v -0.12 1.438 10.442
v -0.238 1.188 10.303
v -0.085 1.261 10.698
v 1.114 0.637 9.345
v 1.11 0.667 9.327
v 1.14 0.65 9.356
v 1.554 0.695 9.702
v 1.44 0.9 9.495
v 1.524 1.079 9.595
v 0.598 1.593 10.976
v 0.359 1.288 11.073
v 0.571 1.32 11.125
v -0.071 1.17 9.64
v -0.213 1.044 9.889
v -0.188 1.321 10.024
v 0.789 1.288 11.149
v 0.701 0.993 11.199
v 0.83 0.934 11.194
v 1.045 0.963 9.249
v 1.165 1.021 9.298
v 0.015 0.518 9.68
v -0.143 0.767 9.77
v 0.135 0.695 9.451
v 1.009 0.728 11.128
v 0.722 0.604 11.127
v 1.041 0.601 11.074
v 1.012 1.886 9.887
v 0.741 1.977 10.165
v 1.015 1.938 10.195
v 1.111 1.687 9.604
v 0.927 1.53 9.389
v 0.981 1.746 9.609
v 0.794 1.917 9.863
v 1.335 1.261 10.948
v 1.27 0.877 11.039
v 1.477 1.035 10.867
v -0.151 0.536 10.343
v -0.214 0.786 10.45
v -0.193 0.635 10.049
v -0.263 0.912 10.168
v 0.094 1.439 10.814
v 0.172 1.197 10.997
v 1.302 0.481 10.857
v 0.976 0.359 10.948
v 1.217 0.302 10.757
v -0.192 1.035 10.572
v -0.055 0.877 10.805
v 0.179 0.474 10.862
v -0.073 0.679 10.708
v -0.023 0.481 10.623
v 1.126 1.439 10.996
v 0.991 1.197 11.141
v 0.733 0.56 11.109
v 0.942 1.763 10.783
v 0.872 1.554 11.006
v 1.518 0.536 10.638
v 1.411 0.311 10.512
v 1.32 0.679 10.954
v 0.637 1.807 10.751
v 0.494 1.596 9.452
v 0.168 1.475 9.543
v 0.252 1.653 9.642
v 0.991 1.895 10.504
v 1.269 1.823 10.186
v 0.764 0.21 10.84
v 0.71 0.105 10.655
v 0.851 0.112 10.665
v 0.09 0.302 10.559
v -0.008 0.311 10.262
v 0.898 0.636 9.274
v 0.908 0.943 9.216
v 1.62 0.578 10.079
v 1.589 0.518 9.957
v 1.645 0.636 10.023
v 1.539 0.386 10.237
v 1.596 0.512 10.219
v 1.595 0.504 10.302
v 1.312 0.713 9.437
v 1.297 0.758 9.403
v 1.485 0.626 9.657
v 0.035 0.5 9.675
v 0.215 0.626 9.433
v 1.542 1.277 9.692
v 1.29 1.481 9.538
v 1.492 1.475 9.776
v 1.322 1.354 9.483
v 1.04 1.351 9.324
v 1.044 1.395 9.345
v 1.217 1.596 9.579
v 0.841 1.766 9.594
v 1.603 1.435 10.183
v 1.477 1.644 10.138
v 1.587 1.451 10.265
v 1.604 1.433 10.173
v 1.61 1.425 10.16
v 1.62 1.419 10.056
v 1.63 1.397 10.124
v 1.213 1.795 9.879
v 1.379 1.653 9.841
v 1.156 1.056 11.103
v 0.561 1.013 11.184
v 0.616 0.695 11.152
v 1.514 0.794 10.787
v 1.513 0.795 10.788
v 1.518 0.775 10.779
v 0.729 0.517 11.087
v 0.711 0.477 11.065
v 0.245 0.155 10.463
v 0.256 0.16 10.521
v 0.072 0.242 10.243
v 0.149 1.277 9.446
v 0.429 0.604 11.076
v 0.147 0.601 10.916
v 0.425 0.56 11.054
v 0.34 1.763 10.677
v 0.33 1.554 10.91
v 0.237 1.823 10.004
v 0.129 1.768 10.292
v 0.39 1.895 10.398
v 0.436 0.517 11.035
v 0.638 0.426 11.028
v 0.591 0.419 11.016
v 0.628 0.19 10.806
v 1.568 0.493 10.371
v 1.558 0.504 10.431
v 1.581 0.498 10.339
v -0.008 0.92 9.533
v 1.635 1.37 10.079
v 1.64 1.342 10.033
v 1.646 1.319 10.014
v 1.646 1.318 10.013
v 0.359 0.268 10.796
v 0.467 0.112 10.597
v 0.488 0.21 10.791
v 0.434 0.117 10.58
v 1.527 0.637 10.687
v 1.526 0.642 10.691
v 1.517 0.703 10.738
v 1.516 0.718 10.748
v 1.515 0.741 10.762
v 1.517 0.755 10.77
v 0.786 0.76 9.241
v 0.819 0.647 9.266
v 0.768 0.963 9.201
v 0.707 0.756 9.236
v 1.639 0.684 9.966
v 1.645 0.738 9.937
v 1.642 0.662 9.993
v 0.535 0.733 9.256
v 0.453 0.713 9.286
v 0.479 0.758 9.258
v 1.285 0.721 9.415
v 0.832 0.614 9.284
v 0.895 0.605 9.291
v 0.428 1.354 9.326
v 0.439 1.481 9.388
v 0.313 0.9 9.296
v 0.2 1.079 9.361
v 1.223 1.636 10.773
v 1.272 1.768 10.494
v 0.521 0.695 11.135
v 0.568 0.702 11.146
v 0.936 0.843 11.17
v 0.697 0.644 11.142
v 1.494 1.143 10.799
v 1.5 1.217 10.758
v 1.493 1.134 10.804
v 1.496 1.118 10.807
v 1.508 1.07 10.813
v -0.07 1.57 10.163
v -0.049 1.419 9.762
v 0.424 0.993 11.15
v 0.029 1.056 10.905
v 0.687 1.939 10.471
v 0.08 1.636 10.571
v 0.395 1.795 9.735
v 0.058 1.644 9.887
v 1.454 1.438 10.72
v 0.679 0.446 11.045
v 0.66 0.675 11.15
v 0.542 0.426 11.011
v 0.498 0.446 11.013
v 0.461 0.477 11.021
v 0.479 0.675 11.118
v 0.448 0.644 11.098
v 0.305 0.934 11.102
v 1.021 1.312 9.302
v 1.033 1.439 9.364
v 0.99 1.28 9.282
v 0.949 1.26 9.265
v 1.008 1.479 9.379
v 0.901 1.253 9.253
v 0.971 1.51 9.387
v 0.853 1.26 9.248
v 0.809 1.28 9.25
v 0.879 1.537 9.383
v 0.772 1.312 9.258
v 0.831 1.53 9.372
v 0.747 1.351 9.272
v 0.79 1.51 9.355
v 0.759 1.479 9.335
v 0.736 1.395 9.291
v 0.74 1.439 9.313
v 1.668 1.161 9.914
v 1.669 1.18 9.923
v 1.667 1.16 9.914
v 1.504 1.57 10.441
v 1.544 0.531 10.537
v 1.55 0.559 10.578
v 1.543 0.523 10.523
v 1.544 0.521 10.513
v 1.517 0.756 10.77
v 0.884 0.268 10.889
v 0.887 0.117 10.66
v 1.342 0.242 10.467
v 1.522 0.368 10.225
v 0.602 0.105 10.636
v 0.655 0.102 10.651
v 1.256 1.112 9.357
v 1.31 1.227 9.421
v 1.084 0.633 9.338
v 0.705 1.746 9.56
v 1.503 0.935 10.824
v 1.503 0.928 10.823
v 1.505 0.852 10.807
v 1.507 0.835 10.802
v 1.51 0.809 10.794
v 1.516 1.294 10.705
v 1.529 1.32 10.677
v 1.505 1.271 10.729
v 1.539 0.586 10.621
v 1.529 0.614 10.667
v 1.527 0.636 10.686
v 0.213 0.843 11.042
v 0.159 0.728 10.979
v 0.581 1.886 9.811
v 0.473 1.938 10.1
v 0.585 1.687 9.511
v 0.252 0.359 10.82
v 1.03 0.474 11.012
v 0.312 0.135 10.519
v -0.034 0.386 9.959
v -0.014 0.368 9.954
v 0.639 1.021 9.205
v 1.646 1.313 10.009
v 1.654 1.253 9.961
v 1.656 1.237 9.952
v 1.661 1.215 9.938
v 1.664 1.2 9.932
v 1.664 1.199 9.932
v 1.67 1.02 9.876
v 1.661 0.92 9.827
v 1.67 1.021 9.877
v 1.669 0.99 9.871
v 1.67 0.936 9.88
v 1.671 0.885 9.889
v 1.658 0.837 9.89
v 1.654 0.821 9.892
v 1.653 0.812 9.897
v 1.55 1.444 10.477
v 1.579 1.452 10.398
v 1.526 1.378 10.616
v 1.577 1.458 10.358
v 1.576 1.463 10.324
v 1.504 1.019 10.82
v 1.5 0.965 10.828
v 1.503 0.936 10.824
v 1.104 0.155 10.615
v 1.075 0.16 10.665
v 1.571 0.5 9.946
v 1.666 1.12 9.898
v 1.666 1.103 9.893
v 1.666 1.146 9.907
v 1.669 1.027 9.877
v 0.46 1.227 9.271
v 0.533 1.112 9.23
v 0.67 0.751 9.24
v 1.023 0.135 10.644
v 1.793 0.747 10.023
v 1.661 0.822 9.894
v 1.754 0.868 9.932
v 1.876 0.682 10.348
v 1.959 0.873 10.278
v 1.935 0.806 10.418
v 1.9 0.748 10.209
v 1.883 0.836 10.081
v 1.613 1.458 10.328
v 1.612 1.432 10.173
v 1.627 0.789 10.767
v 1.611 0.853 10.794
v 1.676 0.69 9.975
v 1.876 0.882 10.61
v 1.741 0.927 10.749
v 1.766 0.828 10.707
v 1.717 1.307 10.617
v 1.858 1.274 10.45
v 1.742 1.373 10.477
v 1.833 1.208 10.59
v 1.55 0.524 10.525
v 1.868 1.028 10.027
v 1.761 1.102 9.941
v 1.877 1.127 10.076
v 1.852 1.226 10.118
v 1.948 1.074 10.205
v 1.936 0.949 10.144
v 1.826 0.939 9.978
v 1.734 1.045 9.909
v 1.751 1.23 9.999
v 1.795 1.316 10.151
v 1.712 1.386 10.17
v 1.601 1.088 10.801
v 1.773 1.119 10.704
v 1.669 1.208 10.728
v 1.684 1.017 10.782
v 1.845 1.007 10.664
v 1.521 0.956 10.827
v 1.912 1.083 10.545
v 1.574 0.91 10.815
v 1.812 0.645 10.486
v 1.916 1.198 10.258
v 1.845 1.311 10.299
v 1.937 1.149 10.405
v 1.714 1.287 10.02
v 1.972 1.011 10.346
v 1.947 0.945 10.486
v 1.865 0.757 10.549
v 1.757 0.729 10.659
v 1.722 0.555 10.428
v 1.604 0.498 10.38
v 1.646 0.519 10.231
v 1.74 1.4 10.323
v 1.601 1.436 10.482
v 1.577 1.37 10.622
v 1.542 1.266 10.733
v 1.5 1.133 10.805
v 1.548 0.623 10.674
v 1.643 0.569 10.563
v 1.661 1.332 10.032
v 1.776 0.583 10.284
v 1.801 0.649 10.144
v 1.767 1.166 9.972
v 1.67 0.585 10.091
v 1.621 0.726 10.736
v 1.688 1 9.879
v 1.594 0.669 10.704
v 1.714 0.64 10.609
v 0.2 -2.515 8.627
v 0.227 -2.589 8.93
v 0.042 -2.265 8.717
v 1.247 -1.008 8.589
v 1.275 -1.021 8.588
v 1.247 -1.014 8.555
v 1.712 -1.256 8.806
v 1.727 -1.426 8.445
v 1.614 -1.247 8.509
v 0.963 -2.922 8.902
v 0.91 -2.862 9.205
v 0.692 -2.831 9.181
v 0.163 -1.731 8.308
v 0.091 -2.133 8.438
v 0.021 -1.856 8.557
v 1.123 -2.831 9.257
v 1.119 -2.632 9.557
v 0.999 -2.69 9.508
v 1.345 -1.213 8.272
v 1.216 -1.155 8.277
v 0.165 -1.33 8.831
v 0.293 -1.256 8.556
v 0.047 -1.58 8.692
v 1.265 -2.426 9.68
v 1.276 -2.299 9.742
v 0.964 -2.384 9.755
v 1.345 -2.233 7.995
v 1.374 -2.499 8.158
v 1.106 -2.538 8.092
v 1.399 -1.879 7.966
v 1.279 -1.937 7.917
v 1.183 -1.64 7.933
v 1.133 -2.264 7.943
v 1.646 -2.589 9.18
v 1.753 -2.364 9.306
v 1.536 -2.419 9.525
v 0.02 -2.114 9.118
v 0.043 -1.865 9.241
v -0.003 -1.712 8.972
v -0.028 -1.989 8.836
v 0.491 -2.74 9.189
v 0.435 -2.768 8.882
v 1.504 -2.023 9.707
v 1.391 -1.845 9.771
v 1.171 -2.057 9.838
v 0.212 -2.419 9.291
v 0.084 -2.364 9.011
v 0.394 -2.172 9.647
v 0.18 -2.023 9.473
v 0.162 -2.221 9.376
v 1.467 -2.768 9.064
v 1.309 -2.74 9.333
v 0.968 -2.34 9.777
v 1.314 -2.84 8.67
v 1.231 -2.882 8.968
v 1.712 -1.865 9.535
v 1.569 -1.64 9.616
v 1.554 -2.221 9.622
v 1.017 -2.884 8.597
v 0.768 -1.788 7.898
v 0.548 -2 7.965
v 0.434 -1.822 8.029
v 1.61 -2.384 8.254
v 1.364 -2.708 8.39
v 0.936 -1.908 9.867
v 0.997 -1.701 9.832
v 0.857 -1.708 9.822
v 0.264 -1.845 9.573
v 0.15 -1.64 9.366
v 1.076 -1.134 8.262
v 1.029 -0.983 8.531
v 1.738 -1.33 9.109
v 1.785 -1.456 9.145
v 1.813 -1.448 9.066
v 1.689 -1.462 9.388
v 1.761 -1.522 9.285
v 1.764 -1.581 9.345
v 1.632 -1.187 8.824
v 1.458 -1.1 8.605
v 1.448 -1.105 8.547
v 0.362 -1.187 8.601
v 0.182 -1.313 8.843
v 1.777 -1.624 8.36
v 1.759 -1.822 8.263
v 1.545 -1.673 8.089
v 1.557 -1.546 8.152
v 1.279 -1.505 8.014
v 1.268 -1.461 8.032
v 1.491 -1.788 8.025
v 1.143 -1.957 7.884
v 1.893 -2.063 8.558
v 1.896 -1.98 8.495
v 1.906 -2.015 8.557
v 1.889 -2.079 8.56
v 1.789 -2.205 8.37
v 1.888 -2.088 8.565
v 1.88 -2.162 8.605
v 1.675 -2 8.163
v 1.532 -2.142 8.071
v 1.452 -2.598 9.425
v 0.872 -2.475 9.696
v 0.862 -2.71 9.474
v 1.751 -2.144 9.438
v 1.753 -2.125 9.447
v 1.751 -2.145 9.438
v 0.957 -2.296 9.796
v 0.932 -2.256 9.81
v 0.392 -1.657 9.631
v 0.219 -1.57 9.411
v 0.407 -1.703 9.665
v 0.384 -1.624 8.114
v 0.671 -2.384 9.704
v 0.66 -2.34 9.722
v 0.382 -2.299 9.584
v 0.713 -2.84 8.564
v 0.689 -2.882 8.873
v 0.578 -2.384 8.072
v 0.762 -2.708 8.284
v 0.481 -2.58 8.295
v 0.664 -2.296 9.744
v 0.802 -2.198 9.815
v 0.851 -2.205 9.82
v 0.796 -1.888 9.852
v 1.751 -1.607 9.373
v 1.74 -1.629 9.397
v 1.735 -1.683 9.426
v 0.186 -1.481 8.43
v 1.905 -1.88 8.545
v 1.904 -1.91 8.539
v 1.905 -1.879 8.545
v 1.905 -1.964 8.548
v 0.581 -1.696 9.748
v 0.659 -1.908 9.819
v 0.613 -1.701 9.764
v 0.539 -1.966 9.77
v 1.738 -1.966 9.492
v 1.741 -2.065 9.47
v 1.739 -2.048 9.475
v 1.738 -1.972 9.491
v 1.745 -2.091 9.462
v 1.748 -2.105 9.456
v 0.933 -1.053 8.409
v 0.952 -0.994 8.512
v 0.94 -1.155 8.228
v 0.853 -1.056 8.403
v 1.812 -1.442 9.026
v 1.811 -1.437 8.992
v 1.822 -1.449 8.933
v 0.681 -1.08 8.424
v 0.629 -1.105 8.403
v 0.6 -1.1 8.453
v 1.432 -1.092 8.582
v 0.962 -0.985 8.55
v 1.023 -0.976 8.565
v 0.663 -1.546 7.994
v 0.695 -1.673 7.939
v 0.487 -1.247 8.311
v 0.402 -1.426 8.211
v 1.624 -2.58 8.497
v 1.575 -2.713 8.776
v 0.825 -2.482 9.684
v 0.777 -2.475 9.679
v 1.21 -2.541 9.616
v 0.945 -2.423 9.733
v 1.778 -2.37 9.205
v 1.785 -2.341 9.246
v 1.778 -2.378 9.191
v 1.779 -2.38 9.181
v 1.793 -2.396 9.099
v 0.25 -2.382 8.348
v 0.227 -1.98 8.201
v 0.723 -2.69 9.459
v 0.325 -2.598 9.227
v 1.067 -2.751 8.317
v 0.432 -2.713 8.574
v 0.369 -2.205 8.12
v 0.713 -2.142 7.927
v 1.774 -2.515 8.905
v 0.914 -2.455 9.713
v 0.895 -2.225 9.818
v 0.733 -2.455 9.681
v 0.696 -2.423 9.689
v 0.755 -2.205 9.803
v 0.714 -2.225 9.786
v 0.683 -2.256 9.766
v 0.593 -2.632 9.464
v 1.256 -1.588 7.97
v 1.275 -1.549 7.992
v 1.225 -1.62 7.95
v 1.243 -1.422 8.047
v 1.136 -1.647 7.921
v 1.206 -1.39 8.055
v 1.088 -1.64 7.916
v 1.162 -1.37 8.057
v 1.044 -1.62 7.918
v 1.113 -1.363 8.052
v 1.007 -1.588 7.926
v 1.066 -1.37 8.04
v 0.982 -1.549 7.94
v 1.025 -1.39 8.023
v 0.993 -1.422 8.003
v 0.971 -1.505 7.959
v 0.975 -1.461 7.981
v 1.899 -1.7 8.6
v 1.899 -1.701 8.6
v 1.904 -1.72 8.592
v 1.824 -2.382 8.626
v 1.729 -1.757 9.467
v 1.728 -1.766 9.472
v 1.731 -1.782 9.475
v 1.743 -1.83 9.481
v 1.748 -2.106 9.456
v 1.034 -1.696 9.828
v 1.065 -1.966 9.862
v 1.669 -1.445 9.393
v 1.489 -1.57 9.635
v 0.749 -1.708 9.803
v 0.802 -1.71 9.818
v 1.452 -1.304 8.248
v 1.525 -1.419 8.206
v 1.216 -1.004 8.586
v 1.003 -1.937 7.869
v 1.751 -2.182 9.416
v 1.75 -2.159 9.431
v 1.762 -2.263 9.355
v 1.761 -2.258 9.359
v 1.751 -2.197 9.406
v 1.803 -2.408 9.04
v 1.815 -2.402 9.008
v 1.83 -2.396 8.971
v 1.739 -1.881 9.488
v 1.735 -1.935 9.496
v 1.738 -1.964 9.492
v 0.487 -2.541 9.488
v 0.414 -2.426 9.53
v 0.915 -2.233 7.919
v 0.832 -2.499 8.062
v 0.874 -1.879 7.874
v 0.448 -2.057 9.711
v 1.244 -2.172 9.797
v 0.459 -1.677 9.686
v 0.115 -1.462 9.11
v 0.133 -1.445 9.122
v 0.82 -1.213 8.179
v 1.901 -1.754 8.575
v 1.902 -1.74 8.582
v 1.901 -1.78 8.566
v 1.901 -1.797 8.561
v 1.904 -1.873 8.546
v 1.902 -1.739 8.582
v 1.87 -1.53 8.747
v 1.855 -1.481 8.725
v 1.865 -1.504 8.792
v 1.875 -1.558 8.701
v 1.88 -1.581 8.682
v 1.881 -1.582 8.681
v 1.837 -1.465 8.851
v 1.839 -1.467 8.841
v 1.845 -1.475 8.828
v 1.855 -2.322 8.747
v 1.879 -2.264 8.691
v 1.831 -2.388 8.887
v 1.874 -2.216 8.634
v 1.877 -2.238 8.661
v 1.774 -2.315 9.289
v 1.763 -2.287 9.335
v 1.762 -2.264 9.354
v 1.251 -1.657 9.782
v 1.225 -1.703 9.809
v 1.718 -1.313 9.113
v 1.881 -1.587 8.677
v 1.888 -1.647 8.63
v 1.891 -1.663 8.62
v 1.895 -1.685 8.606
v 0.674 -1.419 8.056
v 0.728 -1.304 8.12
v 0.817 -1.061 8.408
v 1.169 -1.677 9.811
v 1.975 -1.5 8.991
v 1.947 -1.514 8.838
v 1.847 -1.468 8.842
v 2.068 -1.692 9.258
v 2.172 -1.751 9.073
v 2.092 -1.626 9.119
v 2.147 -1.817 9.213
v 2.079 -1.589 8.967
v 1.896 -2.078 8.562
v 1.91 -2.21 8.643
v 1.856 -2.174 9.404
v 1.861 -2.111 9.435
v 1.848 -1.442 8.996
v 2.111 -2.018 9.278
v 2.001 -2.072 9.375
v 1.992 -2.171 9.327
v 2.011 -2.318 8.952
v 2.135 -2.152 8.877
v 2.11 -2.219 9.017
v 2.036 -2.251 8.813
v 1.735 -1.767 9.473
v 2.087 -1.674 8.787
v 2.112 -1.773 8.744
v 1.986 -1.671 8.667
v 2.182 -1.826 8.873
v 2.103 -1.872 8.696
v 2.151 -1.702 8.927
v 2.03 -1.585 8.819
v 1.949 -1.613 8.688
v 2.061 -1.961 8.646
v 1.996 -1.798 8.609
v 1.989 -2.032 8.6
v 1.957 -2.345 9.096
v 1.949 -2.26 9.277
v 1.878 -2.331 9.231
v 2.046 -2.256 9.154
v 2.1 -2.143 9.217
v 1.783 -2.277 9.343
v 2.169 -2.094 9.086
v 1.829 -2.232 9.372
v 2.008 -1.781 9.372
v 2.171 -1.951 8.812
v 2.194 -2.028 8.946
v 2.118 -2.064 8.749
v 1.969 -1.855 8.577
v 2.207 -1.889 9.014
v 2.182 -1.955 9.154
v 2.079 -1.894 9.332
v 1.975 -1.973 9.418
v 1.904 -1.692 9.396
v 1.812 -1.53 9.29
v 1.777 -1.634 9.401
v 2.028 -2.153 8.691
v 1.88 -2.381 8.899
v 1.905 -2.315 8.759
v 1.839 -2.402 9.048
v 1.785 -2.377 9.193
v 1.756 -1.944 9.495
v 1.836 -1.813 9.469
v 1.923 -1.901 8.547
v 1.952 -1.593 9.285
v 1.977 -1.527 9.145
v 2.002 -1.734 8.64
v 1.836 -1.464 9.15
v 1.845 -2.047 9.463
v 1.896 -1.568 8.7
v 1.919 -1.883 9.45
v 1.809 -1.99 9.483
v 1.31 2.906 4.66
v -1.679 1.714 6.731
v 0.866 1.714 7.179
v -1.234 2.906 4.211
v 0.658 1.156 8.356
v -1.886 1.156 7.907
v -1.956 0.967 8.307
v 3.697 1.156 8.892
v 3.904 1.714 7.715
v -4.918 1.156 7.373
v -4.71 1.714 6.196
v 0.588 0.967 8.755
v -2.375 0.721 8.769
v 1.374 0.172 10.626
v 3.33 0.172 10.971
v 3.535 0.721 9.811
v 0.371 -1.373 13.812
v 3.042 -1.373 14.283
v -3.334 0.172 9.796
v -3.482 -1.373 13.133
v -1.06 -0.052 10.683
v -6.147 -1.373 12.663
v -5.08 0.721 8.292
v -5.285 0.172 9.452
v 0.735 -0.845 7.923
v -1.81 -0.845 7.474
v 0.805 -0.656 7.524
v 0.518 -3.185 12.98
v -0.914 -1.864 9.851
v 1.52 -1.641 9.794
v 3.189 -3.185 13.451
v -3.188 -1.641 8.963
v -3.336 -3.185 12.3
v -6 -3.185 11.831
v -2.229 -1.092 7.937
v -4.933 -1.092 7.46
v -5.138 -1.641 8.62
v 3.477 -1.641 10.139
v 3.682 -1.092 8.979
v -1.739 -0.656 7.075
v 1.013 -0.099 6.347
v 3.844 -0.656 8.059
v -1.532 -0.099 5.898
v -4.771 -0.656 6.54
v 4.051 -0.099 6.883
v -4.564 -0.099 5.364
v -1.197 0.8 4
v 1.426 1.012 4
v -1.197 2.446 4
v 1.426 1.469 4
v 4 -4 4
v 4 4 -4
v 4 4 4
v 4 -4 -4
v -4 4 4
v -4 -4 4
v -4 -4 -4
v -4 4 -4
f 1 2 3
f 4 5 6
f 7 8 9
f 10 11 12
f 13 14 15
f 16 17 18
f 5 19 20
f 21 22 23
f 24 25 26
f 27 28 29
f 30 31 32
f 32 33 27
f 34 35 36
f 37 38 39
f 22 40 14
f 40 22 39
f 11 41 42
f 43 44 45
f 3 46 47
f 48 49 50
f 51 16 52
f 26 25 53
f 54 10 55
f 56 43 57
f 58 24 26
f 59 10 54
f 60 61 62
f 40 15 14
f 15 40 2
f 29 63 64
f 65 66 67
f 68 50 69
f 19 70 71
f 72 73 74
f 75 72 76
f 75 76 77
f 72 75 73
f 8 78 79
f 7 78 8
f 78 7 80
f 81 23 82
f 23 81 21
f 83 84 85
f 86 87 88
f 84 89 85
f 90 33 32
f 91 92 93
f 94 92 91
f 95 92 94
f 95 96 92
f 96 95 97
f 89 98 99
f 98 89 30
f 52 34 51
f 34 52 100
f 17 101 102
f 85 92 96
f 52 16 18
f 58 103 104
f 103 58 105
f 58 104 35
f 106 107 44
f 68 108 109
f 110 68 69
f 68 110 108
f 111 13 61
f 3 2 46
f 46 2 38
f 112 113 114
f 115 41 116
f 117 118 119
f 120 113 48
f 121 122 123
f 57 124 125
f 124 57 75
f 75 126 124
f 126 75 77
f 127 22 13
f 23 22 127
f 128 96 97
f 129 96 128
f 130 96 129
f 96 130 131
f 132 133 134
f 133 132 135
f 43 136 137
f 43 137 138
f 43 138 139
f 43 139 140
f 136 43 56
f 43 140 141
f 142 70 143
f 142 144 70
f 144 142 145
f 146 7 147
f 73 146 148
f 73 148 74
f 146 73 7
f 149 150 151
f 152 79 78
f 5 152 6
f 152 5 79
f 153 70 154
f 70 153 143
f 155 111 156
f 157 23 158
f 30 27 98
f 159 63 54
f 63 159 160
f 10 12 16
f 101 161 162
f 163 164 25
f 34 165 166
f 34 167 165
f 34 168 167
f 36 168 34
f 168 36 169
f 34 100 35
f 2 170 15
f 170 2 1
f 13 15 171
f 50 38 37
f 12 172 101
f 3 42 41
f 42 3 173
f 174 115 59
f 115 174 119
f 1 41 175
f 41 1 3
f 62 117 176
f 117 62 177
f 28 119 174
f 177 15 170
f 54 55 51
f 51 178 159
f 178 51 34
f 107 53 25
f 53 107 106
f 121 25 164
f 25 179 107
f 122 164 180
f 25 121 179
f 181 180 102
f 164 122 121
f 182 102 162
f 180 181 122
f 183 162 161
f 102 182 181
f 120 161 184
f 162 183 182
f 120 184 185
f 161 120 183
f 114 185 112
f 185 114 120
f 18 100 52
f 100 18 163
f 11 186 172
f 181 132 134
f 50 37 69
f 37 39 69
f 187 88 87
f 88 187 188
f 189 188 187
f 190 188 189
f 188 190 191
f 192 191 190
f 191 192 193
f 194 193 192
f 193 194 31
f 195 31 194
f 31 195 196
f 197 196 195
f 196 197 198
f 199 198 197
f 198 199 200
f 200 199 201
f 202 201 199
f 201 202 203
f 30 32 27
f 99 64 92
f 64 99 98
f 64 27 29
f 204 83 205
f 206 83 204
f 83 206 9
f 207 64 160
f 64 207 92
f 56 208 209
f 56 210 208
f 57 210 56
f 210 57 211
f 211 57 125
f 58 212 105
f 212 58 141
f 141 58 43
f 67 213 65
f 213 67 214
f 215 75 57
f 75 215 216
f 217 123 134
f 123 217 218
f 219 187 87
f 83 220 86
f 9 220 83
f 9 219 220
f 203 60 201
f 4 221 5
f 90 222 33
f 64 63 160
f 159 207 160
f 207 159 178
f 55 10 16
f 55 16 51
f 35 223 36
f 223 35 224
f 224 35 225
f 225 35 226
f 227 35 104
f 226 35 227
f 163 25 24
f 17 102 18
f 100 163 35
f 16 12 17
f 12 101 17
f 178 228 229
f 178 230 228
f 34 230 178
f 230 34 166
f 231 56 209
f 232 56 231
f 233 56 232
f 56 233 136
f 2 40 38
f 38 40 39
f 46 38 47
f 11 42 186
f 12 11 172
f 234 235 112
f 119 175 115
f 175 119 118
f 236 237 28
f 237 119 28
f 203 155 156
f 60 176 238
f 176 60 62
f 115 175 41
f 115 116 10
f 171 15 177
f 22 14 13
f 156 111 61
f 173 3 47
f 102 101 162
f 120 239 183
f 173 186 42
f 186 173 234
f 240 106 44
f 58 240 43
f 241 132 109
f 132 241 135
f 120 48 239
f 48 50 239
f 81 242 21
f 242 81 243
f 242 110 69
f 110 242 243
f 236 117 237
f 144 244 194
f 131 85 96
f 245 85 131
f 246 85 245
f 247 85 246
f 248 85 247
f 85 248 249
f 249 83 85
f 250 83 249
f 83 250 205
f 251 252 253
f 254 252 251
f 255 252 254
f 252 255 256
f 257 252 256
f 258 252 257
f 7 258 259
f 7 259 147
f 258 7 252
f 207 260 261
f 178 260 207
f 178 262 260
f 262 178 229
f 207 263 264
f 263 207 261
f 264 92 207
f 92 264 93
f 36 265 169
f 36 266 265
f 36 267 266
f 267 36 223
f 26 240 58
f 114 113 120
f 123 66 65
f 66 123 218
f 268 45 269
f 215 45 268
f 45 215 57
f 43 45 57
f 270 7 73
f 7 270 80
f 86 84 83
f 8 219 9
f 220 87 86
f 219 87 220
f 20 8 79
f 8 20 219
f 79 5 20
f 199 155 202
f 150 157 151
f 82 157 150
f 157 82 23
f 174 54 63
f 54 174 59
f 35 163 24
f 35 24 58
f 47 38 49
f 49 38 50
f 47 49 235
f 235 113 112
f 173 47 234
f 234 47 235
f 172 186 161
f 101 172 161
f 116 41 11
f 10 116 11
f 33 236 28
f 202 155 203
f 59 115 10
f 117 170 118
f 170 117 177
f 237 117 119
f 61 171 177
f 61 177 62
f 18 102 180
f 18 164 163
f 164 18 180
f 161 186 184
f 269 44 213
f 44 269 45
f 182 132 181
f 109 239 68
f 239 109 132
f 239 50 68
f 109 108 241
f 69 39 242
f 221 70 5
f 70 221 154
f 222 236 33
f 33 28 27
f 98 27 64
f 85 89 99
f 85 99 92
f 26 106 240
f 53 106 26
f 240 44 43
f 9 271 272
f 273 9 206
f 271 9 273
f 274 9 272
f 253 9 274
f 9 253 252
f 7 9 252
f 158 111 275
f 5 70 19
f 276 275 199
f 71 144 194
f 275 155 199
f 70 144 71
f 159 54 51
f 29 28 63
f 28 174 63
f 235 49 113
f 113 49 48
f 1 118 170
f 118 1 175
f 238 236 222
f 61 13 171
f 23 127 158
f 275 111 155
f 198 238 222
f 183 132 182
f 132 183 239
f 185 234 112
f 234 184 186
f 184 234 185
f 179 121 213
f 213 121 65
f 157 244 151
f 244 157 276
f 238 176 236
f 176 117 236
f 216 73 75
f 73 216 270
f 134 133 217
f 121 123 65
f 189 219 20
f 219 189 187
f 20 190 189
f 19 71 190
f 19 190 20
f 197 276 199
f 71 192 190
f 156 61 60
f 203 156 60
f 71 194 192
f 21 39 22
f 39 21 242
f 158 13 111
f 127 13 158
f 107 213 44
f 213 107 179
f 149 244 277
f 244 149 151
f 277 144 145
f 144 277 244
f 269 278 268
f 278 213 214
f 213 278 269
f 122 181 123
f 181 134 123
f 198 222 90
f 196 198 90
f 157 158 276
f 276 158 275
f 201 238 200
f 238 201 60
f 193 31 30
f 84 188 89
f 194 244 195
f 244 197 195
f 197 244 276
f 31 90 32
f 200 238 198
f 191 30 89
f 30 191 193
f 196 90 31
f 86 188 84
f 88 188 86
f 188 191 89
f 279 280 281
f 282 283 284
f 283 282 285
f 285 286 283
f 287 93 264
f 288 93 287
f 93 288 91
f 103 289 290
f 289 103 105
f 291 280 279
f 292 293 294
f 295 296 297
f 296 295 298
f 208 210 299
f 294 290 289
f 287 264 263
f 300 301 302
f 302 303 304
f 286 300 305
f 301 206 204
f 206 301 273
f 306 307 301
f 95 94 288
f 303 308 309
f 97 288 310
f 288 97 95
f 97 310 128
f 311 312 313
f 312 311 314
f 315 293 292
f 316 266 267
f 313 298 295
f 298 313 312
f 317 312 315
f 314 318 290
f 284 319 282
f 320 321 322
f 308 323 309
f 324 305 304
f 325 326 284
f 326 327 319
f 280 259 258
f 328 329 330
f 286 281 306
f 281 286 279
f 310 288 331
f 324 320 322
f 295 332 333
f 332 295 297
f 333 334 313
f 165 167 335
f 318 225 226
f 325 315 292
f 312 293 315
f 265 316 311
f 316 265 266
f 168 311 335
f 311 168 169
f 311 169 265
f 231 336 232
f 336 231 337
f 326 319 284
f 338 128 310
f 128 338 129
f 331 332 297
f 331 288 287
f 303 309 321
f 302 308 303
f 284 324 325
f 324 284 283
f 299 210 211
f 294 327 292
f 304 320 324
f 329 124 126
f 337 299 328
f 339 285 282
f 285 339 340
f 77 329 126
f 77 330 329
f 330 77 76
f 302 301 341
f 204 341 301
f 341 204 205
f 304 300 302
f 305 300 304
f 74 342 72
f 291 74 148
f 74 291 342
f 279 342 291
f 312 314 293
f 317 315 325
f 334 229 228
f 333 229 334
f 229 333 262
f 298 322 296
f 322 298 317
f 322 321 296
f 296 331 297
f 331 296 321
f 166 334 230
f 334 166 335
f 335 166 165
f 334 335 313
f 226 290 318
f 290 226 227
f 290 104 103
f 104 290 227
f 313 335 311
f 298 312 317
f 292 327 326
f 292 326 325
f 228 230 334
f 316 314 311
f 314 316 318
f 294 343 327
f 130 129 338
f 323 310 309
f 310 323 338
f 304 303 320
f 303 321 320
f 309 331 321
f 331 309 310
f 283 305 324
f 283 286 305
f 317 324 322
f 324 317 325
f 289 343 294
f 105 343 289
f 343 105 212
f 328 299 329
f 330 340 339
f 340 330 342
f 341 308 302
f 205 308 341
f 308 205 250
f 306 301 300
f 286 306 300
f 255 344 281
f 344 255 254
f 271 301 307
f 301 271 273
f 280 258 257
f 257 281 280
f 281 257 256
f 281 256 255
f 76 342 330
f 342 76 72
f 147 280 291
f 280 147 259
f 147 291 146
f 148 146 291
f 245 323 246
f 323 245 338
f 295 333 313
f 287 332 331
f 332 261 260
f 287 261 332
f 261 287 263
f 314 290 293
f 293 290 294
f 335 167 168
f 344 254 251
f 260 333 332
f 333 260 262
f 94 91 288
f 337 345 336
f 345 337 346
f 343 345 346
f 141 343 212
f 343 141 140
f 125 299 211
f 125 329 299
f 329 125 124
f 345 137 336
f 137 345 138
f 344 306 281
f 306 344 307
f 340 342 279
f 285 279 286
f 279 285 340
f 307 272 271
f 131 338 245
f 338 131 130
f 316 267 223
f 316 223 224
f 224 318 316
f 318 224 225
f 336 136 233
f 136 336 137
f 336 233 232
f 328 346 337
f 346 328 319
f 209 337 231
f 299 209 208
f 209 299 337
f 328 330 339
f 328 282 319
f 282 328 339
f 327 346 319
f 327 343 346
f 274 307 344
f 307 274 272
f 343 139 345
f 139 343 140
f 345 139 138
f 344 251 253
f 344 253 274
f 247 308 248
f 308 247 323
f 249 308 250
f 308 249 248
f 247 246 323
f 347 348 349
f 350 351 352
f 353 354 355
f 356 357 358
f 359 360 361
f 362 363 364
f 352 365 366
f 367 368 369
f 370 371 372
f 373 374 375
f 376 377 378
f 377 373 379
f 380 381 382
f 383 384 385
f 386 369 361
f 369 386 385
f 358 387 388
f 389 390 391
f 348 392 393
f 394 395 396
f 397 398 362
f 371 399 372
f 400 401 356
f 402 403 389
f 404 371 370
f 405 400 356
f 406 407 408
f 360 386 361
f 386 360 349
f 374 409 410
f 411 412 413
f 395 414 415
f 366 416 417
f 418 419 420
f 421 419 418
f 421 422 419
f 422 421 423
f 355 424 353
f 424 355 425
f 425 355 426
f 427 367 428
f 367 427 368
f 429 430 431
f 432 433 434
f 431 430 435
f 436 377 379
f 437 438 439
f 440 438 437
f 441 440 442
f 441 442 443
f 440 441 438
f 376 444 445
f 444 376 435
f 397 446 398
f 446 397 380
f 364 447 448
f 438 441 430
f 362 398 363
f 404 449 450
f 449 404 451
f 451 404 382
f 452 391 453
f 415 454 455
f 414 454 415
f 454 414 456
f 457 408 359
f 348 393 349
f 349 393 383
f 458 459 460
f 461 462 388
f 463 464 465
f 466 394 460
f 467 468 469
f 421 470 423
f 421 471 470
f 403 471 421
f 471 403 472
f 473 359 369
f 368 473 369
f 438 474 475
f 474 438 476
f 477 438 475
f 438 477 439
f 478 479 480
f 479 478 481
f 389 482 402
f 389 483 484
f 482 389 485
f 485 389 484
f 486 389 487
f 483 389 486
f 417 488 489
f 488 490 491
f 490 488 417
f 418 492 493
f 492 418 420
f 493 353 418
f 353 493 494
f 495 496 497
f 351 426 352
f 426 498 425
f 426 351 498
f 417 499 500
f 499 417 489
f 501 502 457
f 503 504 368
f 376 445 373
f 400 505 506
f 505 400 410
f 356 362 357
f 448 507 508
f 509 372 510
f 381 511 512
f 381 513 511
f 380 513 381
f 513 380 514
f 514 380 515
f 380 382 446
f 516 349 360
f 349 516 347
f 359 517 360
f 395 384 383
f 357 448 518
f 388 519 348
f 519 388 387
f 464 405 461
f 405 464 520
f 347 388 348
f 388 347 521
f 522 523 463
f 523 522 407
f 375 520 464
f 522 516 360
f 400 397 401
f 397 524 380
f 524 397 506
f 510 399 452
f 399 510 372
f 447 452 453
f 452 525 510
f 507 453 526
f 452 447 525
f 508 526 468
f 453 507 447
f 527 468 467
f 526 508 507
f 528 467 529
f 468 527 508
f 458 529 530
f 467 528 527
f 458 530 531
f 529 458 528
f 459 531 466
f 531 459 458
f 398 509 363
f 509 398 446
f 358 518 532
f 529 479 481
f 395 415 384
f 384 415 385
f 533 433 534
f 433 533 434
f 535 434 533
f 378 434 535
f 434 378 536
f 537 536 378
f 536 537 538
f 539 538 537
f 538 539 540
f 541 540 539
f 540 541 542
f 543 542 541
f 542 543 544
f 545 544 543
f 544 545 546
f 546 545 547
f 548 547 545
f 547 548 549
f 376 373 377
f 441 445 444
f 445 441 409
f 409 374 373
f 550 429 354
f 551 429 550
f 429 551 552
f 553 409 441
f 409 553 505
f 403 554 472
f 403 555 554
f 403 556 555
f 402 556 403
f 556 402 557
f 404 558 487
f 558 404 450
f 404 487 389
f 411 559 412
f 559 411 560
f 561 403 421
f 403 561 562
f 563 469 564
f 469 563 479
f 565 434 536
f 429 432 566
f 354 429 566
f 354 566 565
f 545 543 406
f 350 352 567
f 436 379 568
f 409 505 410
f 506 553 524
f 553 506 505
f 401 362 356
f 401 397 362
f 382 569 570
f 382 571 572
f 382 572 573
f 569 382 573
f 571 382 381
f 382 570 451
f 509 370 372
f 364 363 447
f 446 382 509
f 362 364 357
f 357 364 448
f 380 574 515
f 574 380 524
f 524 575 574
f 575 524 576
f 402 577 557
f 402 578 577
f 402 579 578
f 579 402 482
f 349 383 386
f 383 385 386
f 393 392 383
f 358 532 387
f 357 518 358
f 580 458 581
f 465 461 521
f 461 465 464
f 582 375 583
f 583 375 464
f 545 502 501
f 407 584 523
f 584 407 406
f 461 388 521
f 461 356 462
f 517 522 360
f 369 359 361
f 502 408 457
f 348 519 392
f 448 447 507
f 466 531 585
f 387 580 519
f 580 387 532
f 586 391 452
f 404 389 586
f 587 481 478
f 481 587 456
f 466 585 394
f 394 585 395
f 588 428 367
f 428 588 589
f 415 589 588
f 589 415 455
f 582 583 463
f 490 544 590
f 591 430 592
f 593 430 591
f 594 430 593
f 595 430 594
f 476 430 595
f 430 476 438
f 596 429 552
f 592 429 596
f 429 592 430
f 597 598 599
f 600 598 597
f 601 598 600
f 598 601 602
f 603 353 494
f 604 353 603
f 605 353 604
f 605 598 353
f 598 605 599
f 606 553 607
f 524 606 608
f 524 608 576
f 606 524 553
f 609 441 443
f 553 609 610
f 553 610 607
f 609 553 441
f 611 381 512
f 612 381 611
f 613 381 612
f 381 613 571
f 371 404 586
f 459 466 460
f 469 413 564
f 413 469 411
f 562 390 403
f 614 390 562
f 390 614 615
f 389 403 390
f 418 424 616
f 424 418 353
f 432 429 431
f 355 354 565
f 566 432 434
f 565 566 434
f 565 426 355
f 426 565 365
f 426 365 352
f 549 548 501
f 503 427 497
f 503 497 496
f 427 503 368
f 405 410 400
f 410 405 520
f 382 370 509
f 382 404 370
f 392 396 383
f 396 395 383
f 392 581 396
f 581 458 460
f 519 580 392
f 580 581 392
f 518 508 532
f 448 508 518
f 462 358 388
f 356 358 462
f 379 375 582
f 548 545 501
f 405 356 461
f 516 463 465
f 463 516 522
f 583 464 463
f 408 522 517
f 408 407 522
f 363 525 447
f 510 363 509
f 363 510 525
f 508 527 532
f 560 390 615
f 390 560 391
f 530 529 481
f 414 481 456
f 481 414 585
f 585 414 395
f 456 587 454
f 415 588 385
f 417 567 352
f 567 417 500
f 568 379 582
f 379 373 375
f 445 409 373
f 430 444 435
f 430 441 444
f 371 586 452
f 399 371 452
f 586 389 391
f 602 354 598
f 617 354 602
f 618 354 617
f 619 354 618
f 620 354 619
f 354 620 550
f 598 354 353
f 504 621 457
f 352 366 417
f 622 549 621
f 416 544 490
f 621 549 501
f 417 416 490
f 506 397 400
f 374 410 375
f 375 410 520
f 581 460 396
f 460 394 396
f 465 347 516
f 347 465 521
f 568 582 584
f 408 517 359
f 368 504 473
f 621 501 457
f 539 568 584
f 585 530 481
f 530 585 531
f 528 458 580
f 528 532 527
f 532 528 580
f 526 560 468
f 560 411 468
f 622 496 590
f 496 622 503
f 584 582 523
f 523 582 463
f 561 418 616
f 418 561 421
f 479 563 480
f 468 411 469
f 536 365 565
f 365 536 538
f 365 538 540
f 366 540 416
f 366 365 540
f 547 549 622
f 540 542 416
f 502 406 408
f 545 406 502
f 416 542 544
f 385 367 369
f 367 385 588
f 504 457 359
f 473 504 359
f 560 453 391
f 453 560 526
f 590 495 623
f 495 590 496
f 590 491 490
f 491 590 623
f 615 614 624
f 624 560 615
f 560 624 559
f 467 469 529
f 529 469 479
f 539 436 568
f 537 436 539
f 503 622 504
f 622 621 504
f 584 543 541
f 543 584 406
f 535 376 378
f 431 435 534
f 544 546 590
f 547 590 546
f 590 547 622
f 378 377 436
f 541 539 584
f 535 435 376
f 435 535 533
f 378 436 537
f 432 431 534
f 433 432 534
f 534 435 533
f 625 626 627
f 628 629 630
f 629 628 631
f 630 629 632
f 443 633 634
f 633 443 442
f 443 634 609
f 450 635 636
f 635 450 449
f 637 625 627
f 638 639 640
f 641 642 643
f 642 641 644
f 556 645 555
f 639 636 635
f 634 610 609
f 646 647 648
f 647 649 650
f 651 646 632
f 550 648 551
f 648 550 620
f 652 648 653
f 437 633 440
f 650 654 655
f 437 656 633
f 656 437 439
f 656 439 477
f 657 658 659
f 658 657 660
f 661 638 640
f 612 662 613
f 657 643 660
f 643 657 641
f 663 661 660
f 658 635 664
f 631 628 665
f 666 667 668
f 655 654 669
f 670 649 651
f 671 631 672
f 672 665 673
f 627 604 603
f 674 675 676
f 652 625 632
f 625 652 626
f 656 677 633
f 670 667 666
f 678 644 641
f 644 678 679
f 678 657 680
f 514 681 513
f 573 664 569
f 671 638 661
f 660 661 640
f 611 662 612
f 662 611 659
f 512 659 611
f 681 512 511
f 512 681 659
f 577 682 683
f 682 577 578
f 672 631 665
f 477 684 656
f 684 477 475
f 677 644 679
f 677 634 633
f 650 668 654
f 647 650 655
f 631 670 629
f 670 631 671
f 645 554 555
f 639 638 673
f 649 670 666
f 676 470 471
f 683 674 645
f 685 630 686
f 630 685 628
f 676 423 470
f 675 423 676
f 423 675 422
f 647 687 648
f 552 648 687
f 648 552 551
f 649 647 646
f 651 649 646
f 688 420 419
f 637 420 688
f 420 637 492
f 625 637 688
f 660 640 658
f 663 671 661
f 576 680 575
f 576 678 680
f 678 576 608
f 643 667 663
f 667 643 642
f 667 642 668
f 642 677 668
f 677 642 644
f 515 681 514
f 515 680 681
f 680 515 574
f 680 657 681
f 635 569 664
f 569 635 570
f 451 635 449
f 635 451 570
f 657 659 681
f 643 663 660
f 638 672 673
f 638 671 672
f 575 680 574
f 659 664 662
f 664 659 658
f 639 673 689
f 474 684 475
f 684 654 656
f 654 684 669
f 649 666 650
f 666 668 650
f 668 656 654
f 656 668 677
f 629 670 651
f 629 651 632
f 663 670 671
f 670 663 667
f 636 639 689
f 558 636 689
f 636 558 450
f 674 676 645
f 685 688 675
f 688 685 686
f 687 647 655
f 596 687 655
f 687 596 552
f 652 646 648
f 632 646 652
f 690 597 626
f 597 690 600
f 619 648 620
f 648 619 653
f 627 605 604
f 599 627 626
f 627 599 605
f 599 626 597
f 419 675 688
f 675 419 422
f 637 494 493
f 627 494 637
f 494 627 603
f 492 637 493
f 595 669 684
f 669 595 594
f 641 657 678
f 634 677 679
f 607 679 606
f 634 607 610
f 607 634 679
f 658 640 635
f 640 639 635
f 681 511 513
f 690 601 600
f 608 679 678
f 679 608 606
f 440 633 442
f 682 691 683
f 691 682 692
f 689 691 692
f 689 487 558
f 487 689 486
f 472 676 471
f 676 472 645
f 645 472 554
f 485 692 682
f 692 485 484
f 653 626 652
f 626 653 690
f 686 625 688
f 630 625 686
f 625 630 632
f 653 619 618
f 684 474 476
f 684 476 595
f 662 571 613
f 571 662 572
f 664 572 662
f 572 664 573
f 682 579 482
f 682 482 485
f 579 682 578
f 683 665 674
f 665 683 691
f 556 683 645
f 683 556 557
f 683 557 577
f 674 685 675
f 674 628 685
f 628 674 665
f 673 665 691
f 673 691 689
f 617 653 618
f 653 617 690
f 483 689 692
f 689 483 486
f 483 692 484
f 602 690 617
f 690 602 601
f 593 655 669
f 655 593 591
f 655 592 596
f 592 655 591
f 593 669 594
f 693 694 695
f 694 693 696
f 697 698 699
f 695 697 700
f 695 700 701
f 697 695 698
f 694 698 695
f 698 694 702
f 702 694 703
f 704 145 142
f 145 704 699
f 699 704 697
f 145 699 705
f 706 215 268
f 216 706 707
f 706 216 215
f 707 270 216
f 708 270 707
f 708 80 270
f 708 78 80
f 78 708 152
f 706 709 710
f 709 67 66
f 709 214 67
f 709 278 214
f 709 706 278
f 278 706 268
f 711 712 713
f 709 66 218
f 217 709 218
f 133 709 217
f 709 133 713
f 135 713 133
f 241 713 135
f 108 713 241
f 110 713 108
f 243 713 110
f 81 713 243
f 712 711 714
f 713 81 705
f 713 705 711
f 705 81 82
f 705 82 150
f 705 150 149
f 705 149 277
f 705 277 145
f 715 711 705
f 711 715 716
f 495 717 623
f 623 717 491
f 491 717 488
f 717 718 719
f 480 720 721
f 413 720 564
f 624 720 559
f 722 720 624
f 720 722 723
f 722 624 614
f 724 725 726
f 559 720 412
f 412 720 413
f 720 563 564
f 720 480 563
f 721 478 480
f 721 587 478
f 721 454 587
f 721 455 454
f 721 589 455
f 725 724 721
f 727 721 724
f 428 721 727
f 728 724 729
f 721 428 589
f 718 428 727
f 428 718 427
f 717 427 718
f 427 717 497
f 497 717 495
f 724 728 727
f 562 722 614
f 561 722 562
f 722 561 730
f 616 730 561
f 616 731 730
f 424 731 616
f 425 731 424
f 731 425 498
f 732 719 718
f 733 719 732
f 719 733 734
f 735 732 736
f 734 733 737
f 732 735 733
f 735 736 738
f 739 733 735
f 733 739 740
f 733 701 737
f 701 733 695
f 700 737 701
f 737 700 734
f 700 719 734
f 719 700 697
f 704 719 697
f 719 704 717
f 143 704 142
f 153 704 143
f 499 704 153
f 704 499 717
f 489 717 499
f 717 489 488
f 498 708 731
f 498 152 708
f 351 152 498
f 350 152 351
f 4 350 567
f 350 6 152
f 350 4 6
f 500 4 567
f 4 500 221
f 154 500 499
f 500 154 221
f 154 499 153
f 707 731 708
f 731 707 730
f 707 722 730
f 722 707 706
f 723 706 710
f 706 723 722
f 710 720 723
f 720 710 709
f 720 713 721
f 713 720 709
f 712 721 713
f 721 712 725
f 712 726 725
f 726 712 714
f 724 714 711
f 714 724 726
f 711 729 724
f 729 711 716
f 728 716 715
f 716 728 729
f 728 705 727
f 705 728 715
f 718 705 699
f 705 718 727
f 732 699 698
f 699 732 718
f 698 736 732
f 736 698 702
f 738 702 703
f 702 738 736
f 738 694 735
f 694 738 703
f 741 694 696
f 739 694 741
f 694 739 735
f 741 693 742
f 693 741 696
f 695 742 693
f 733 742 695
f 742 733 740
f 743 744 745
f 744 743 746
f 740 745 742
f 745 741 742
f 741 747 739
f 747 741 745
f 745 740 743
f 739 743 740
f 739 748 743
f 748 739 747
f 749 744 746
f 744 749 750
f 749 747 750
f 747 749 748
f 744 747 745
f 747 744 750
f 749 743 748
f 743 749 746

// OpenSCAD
// file: character.scad
$fn = 20;

font="Book Antiqua:style=Bold";
font_size = 9;
t = 2;

eye_r = 1;
eye_pupil_r = 0.5;


module character(char) {
    rotate([90,0,0])
        translate([0,0,-t]/2)
            linear_extrude(height=t)
                text(char, font=font, halign="center");
    pair_of_eyes();
}

module pair_of_eyes() {
    module eye() {
        color("white")
            sphere(r=eye_r);
        translate([eye_r-eye_pupil_r/2,0,0])
            color("black")
                sphere(r=eye_pupil_r);
    }
    
    module eye_position() {
        translate([0.2*font_size, 0.8*t, font_size*0.65])
            children();
    }
    
    mirror(v=[0,1,0])
        eye_position()
            eye();
    eye_position()
        eye();
}

char = "€";
character(char);
// main file
use <character.scad>

$fn=100;

pedestal_color = [0.8, 0.8, 0.8];

module eur_scene() {
    color(pedestal_color)
        cube([8,8,8], center=true);
    translate([0,0,5])
        rotate([10,5,0])
            character("€", [0.269, 0.347, 0.953], true);
}

module usd_scene() {
    color(pedestal_color)
        cube([8,8,8], center=true);
    translate([0,0,15])
        rotate([170,-5,-10])
            character("$", [0, 1.0, 0]);
}

module gbp_scene() {
    color(pedestal_color)
        cube([8,8,8], center=true);
    translate([0,0,4])
        rotate([0,10,0])
            character("£", [1.0, 0.65, 0], true);
}

module yen_scene() {
    color(pedestal_color)
        cube([8,8,8], center=true);
    translate([0,2,4])
        rotate([25,-10,0])
            character("¥", [0.7, 0.3, 0.95]);
}

scene = "yen";

// euro:
// camera translate: [3.32, 0.74, 4.9]
// camera rotate: [113.80, 0, 58.6]
// distance: 54.24
if (scene == "eur") {
    eur_scene();
}

// usd:
// camera translate: [2.39, -0.46, 5.62]
// camera rotate: [102.60, 0, 49.50]
// distance: 60.27
if (scene == "usd") {
    usd_scene();
}

// gbp:
// camera translate: [2.64, 3.31, 7.28]
// camera rotate: [112.4, 0, 52.3]
// distance: 43.93
if (scene == "gbp") {
    gbp_scene();
}

// yen:
// camera translate: [0.63,1.26,4.97]
// camera rotate: [84.4,0,50.2]
// distance: 54.24
if (scene == "yen") {
    yen_scene();
}
